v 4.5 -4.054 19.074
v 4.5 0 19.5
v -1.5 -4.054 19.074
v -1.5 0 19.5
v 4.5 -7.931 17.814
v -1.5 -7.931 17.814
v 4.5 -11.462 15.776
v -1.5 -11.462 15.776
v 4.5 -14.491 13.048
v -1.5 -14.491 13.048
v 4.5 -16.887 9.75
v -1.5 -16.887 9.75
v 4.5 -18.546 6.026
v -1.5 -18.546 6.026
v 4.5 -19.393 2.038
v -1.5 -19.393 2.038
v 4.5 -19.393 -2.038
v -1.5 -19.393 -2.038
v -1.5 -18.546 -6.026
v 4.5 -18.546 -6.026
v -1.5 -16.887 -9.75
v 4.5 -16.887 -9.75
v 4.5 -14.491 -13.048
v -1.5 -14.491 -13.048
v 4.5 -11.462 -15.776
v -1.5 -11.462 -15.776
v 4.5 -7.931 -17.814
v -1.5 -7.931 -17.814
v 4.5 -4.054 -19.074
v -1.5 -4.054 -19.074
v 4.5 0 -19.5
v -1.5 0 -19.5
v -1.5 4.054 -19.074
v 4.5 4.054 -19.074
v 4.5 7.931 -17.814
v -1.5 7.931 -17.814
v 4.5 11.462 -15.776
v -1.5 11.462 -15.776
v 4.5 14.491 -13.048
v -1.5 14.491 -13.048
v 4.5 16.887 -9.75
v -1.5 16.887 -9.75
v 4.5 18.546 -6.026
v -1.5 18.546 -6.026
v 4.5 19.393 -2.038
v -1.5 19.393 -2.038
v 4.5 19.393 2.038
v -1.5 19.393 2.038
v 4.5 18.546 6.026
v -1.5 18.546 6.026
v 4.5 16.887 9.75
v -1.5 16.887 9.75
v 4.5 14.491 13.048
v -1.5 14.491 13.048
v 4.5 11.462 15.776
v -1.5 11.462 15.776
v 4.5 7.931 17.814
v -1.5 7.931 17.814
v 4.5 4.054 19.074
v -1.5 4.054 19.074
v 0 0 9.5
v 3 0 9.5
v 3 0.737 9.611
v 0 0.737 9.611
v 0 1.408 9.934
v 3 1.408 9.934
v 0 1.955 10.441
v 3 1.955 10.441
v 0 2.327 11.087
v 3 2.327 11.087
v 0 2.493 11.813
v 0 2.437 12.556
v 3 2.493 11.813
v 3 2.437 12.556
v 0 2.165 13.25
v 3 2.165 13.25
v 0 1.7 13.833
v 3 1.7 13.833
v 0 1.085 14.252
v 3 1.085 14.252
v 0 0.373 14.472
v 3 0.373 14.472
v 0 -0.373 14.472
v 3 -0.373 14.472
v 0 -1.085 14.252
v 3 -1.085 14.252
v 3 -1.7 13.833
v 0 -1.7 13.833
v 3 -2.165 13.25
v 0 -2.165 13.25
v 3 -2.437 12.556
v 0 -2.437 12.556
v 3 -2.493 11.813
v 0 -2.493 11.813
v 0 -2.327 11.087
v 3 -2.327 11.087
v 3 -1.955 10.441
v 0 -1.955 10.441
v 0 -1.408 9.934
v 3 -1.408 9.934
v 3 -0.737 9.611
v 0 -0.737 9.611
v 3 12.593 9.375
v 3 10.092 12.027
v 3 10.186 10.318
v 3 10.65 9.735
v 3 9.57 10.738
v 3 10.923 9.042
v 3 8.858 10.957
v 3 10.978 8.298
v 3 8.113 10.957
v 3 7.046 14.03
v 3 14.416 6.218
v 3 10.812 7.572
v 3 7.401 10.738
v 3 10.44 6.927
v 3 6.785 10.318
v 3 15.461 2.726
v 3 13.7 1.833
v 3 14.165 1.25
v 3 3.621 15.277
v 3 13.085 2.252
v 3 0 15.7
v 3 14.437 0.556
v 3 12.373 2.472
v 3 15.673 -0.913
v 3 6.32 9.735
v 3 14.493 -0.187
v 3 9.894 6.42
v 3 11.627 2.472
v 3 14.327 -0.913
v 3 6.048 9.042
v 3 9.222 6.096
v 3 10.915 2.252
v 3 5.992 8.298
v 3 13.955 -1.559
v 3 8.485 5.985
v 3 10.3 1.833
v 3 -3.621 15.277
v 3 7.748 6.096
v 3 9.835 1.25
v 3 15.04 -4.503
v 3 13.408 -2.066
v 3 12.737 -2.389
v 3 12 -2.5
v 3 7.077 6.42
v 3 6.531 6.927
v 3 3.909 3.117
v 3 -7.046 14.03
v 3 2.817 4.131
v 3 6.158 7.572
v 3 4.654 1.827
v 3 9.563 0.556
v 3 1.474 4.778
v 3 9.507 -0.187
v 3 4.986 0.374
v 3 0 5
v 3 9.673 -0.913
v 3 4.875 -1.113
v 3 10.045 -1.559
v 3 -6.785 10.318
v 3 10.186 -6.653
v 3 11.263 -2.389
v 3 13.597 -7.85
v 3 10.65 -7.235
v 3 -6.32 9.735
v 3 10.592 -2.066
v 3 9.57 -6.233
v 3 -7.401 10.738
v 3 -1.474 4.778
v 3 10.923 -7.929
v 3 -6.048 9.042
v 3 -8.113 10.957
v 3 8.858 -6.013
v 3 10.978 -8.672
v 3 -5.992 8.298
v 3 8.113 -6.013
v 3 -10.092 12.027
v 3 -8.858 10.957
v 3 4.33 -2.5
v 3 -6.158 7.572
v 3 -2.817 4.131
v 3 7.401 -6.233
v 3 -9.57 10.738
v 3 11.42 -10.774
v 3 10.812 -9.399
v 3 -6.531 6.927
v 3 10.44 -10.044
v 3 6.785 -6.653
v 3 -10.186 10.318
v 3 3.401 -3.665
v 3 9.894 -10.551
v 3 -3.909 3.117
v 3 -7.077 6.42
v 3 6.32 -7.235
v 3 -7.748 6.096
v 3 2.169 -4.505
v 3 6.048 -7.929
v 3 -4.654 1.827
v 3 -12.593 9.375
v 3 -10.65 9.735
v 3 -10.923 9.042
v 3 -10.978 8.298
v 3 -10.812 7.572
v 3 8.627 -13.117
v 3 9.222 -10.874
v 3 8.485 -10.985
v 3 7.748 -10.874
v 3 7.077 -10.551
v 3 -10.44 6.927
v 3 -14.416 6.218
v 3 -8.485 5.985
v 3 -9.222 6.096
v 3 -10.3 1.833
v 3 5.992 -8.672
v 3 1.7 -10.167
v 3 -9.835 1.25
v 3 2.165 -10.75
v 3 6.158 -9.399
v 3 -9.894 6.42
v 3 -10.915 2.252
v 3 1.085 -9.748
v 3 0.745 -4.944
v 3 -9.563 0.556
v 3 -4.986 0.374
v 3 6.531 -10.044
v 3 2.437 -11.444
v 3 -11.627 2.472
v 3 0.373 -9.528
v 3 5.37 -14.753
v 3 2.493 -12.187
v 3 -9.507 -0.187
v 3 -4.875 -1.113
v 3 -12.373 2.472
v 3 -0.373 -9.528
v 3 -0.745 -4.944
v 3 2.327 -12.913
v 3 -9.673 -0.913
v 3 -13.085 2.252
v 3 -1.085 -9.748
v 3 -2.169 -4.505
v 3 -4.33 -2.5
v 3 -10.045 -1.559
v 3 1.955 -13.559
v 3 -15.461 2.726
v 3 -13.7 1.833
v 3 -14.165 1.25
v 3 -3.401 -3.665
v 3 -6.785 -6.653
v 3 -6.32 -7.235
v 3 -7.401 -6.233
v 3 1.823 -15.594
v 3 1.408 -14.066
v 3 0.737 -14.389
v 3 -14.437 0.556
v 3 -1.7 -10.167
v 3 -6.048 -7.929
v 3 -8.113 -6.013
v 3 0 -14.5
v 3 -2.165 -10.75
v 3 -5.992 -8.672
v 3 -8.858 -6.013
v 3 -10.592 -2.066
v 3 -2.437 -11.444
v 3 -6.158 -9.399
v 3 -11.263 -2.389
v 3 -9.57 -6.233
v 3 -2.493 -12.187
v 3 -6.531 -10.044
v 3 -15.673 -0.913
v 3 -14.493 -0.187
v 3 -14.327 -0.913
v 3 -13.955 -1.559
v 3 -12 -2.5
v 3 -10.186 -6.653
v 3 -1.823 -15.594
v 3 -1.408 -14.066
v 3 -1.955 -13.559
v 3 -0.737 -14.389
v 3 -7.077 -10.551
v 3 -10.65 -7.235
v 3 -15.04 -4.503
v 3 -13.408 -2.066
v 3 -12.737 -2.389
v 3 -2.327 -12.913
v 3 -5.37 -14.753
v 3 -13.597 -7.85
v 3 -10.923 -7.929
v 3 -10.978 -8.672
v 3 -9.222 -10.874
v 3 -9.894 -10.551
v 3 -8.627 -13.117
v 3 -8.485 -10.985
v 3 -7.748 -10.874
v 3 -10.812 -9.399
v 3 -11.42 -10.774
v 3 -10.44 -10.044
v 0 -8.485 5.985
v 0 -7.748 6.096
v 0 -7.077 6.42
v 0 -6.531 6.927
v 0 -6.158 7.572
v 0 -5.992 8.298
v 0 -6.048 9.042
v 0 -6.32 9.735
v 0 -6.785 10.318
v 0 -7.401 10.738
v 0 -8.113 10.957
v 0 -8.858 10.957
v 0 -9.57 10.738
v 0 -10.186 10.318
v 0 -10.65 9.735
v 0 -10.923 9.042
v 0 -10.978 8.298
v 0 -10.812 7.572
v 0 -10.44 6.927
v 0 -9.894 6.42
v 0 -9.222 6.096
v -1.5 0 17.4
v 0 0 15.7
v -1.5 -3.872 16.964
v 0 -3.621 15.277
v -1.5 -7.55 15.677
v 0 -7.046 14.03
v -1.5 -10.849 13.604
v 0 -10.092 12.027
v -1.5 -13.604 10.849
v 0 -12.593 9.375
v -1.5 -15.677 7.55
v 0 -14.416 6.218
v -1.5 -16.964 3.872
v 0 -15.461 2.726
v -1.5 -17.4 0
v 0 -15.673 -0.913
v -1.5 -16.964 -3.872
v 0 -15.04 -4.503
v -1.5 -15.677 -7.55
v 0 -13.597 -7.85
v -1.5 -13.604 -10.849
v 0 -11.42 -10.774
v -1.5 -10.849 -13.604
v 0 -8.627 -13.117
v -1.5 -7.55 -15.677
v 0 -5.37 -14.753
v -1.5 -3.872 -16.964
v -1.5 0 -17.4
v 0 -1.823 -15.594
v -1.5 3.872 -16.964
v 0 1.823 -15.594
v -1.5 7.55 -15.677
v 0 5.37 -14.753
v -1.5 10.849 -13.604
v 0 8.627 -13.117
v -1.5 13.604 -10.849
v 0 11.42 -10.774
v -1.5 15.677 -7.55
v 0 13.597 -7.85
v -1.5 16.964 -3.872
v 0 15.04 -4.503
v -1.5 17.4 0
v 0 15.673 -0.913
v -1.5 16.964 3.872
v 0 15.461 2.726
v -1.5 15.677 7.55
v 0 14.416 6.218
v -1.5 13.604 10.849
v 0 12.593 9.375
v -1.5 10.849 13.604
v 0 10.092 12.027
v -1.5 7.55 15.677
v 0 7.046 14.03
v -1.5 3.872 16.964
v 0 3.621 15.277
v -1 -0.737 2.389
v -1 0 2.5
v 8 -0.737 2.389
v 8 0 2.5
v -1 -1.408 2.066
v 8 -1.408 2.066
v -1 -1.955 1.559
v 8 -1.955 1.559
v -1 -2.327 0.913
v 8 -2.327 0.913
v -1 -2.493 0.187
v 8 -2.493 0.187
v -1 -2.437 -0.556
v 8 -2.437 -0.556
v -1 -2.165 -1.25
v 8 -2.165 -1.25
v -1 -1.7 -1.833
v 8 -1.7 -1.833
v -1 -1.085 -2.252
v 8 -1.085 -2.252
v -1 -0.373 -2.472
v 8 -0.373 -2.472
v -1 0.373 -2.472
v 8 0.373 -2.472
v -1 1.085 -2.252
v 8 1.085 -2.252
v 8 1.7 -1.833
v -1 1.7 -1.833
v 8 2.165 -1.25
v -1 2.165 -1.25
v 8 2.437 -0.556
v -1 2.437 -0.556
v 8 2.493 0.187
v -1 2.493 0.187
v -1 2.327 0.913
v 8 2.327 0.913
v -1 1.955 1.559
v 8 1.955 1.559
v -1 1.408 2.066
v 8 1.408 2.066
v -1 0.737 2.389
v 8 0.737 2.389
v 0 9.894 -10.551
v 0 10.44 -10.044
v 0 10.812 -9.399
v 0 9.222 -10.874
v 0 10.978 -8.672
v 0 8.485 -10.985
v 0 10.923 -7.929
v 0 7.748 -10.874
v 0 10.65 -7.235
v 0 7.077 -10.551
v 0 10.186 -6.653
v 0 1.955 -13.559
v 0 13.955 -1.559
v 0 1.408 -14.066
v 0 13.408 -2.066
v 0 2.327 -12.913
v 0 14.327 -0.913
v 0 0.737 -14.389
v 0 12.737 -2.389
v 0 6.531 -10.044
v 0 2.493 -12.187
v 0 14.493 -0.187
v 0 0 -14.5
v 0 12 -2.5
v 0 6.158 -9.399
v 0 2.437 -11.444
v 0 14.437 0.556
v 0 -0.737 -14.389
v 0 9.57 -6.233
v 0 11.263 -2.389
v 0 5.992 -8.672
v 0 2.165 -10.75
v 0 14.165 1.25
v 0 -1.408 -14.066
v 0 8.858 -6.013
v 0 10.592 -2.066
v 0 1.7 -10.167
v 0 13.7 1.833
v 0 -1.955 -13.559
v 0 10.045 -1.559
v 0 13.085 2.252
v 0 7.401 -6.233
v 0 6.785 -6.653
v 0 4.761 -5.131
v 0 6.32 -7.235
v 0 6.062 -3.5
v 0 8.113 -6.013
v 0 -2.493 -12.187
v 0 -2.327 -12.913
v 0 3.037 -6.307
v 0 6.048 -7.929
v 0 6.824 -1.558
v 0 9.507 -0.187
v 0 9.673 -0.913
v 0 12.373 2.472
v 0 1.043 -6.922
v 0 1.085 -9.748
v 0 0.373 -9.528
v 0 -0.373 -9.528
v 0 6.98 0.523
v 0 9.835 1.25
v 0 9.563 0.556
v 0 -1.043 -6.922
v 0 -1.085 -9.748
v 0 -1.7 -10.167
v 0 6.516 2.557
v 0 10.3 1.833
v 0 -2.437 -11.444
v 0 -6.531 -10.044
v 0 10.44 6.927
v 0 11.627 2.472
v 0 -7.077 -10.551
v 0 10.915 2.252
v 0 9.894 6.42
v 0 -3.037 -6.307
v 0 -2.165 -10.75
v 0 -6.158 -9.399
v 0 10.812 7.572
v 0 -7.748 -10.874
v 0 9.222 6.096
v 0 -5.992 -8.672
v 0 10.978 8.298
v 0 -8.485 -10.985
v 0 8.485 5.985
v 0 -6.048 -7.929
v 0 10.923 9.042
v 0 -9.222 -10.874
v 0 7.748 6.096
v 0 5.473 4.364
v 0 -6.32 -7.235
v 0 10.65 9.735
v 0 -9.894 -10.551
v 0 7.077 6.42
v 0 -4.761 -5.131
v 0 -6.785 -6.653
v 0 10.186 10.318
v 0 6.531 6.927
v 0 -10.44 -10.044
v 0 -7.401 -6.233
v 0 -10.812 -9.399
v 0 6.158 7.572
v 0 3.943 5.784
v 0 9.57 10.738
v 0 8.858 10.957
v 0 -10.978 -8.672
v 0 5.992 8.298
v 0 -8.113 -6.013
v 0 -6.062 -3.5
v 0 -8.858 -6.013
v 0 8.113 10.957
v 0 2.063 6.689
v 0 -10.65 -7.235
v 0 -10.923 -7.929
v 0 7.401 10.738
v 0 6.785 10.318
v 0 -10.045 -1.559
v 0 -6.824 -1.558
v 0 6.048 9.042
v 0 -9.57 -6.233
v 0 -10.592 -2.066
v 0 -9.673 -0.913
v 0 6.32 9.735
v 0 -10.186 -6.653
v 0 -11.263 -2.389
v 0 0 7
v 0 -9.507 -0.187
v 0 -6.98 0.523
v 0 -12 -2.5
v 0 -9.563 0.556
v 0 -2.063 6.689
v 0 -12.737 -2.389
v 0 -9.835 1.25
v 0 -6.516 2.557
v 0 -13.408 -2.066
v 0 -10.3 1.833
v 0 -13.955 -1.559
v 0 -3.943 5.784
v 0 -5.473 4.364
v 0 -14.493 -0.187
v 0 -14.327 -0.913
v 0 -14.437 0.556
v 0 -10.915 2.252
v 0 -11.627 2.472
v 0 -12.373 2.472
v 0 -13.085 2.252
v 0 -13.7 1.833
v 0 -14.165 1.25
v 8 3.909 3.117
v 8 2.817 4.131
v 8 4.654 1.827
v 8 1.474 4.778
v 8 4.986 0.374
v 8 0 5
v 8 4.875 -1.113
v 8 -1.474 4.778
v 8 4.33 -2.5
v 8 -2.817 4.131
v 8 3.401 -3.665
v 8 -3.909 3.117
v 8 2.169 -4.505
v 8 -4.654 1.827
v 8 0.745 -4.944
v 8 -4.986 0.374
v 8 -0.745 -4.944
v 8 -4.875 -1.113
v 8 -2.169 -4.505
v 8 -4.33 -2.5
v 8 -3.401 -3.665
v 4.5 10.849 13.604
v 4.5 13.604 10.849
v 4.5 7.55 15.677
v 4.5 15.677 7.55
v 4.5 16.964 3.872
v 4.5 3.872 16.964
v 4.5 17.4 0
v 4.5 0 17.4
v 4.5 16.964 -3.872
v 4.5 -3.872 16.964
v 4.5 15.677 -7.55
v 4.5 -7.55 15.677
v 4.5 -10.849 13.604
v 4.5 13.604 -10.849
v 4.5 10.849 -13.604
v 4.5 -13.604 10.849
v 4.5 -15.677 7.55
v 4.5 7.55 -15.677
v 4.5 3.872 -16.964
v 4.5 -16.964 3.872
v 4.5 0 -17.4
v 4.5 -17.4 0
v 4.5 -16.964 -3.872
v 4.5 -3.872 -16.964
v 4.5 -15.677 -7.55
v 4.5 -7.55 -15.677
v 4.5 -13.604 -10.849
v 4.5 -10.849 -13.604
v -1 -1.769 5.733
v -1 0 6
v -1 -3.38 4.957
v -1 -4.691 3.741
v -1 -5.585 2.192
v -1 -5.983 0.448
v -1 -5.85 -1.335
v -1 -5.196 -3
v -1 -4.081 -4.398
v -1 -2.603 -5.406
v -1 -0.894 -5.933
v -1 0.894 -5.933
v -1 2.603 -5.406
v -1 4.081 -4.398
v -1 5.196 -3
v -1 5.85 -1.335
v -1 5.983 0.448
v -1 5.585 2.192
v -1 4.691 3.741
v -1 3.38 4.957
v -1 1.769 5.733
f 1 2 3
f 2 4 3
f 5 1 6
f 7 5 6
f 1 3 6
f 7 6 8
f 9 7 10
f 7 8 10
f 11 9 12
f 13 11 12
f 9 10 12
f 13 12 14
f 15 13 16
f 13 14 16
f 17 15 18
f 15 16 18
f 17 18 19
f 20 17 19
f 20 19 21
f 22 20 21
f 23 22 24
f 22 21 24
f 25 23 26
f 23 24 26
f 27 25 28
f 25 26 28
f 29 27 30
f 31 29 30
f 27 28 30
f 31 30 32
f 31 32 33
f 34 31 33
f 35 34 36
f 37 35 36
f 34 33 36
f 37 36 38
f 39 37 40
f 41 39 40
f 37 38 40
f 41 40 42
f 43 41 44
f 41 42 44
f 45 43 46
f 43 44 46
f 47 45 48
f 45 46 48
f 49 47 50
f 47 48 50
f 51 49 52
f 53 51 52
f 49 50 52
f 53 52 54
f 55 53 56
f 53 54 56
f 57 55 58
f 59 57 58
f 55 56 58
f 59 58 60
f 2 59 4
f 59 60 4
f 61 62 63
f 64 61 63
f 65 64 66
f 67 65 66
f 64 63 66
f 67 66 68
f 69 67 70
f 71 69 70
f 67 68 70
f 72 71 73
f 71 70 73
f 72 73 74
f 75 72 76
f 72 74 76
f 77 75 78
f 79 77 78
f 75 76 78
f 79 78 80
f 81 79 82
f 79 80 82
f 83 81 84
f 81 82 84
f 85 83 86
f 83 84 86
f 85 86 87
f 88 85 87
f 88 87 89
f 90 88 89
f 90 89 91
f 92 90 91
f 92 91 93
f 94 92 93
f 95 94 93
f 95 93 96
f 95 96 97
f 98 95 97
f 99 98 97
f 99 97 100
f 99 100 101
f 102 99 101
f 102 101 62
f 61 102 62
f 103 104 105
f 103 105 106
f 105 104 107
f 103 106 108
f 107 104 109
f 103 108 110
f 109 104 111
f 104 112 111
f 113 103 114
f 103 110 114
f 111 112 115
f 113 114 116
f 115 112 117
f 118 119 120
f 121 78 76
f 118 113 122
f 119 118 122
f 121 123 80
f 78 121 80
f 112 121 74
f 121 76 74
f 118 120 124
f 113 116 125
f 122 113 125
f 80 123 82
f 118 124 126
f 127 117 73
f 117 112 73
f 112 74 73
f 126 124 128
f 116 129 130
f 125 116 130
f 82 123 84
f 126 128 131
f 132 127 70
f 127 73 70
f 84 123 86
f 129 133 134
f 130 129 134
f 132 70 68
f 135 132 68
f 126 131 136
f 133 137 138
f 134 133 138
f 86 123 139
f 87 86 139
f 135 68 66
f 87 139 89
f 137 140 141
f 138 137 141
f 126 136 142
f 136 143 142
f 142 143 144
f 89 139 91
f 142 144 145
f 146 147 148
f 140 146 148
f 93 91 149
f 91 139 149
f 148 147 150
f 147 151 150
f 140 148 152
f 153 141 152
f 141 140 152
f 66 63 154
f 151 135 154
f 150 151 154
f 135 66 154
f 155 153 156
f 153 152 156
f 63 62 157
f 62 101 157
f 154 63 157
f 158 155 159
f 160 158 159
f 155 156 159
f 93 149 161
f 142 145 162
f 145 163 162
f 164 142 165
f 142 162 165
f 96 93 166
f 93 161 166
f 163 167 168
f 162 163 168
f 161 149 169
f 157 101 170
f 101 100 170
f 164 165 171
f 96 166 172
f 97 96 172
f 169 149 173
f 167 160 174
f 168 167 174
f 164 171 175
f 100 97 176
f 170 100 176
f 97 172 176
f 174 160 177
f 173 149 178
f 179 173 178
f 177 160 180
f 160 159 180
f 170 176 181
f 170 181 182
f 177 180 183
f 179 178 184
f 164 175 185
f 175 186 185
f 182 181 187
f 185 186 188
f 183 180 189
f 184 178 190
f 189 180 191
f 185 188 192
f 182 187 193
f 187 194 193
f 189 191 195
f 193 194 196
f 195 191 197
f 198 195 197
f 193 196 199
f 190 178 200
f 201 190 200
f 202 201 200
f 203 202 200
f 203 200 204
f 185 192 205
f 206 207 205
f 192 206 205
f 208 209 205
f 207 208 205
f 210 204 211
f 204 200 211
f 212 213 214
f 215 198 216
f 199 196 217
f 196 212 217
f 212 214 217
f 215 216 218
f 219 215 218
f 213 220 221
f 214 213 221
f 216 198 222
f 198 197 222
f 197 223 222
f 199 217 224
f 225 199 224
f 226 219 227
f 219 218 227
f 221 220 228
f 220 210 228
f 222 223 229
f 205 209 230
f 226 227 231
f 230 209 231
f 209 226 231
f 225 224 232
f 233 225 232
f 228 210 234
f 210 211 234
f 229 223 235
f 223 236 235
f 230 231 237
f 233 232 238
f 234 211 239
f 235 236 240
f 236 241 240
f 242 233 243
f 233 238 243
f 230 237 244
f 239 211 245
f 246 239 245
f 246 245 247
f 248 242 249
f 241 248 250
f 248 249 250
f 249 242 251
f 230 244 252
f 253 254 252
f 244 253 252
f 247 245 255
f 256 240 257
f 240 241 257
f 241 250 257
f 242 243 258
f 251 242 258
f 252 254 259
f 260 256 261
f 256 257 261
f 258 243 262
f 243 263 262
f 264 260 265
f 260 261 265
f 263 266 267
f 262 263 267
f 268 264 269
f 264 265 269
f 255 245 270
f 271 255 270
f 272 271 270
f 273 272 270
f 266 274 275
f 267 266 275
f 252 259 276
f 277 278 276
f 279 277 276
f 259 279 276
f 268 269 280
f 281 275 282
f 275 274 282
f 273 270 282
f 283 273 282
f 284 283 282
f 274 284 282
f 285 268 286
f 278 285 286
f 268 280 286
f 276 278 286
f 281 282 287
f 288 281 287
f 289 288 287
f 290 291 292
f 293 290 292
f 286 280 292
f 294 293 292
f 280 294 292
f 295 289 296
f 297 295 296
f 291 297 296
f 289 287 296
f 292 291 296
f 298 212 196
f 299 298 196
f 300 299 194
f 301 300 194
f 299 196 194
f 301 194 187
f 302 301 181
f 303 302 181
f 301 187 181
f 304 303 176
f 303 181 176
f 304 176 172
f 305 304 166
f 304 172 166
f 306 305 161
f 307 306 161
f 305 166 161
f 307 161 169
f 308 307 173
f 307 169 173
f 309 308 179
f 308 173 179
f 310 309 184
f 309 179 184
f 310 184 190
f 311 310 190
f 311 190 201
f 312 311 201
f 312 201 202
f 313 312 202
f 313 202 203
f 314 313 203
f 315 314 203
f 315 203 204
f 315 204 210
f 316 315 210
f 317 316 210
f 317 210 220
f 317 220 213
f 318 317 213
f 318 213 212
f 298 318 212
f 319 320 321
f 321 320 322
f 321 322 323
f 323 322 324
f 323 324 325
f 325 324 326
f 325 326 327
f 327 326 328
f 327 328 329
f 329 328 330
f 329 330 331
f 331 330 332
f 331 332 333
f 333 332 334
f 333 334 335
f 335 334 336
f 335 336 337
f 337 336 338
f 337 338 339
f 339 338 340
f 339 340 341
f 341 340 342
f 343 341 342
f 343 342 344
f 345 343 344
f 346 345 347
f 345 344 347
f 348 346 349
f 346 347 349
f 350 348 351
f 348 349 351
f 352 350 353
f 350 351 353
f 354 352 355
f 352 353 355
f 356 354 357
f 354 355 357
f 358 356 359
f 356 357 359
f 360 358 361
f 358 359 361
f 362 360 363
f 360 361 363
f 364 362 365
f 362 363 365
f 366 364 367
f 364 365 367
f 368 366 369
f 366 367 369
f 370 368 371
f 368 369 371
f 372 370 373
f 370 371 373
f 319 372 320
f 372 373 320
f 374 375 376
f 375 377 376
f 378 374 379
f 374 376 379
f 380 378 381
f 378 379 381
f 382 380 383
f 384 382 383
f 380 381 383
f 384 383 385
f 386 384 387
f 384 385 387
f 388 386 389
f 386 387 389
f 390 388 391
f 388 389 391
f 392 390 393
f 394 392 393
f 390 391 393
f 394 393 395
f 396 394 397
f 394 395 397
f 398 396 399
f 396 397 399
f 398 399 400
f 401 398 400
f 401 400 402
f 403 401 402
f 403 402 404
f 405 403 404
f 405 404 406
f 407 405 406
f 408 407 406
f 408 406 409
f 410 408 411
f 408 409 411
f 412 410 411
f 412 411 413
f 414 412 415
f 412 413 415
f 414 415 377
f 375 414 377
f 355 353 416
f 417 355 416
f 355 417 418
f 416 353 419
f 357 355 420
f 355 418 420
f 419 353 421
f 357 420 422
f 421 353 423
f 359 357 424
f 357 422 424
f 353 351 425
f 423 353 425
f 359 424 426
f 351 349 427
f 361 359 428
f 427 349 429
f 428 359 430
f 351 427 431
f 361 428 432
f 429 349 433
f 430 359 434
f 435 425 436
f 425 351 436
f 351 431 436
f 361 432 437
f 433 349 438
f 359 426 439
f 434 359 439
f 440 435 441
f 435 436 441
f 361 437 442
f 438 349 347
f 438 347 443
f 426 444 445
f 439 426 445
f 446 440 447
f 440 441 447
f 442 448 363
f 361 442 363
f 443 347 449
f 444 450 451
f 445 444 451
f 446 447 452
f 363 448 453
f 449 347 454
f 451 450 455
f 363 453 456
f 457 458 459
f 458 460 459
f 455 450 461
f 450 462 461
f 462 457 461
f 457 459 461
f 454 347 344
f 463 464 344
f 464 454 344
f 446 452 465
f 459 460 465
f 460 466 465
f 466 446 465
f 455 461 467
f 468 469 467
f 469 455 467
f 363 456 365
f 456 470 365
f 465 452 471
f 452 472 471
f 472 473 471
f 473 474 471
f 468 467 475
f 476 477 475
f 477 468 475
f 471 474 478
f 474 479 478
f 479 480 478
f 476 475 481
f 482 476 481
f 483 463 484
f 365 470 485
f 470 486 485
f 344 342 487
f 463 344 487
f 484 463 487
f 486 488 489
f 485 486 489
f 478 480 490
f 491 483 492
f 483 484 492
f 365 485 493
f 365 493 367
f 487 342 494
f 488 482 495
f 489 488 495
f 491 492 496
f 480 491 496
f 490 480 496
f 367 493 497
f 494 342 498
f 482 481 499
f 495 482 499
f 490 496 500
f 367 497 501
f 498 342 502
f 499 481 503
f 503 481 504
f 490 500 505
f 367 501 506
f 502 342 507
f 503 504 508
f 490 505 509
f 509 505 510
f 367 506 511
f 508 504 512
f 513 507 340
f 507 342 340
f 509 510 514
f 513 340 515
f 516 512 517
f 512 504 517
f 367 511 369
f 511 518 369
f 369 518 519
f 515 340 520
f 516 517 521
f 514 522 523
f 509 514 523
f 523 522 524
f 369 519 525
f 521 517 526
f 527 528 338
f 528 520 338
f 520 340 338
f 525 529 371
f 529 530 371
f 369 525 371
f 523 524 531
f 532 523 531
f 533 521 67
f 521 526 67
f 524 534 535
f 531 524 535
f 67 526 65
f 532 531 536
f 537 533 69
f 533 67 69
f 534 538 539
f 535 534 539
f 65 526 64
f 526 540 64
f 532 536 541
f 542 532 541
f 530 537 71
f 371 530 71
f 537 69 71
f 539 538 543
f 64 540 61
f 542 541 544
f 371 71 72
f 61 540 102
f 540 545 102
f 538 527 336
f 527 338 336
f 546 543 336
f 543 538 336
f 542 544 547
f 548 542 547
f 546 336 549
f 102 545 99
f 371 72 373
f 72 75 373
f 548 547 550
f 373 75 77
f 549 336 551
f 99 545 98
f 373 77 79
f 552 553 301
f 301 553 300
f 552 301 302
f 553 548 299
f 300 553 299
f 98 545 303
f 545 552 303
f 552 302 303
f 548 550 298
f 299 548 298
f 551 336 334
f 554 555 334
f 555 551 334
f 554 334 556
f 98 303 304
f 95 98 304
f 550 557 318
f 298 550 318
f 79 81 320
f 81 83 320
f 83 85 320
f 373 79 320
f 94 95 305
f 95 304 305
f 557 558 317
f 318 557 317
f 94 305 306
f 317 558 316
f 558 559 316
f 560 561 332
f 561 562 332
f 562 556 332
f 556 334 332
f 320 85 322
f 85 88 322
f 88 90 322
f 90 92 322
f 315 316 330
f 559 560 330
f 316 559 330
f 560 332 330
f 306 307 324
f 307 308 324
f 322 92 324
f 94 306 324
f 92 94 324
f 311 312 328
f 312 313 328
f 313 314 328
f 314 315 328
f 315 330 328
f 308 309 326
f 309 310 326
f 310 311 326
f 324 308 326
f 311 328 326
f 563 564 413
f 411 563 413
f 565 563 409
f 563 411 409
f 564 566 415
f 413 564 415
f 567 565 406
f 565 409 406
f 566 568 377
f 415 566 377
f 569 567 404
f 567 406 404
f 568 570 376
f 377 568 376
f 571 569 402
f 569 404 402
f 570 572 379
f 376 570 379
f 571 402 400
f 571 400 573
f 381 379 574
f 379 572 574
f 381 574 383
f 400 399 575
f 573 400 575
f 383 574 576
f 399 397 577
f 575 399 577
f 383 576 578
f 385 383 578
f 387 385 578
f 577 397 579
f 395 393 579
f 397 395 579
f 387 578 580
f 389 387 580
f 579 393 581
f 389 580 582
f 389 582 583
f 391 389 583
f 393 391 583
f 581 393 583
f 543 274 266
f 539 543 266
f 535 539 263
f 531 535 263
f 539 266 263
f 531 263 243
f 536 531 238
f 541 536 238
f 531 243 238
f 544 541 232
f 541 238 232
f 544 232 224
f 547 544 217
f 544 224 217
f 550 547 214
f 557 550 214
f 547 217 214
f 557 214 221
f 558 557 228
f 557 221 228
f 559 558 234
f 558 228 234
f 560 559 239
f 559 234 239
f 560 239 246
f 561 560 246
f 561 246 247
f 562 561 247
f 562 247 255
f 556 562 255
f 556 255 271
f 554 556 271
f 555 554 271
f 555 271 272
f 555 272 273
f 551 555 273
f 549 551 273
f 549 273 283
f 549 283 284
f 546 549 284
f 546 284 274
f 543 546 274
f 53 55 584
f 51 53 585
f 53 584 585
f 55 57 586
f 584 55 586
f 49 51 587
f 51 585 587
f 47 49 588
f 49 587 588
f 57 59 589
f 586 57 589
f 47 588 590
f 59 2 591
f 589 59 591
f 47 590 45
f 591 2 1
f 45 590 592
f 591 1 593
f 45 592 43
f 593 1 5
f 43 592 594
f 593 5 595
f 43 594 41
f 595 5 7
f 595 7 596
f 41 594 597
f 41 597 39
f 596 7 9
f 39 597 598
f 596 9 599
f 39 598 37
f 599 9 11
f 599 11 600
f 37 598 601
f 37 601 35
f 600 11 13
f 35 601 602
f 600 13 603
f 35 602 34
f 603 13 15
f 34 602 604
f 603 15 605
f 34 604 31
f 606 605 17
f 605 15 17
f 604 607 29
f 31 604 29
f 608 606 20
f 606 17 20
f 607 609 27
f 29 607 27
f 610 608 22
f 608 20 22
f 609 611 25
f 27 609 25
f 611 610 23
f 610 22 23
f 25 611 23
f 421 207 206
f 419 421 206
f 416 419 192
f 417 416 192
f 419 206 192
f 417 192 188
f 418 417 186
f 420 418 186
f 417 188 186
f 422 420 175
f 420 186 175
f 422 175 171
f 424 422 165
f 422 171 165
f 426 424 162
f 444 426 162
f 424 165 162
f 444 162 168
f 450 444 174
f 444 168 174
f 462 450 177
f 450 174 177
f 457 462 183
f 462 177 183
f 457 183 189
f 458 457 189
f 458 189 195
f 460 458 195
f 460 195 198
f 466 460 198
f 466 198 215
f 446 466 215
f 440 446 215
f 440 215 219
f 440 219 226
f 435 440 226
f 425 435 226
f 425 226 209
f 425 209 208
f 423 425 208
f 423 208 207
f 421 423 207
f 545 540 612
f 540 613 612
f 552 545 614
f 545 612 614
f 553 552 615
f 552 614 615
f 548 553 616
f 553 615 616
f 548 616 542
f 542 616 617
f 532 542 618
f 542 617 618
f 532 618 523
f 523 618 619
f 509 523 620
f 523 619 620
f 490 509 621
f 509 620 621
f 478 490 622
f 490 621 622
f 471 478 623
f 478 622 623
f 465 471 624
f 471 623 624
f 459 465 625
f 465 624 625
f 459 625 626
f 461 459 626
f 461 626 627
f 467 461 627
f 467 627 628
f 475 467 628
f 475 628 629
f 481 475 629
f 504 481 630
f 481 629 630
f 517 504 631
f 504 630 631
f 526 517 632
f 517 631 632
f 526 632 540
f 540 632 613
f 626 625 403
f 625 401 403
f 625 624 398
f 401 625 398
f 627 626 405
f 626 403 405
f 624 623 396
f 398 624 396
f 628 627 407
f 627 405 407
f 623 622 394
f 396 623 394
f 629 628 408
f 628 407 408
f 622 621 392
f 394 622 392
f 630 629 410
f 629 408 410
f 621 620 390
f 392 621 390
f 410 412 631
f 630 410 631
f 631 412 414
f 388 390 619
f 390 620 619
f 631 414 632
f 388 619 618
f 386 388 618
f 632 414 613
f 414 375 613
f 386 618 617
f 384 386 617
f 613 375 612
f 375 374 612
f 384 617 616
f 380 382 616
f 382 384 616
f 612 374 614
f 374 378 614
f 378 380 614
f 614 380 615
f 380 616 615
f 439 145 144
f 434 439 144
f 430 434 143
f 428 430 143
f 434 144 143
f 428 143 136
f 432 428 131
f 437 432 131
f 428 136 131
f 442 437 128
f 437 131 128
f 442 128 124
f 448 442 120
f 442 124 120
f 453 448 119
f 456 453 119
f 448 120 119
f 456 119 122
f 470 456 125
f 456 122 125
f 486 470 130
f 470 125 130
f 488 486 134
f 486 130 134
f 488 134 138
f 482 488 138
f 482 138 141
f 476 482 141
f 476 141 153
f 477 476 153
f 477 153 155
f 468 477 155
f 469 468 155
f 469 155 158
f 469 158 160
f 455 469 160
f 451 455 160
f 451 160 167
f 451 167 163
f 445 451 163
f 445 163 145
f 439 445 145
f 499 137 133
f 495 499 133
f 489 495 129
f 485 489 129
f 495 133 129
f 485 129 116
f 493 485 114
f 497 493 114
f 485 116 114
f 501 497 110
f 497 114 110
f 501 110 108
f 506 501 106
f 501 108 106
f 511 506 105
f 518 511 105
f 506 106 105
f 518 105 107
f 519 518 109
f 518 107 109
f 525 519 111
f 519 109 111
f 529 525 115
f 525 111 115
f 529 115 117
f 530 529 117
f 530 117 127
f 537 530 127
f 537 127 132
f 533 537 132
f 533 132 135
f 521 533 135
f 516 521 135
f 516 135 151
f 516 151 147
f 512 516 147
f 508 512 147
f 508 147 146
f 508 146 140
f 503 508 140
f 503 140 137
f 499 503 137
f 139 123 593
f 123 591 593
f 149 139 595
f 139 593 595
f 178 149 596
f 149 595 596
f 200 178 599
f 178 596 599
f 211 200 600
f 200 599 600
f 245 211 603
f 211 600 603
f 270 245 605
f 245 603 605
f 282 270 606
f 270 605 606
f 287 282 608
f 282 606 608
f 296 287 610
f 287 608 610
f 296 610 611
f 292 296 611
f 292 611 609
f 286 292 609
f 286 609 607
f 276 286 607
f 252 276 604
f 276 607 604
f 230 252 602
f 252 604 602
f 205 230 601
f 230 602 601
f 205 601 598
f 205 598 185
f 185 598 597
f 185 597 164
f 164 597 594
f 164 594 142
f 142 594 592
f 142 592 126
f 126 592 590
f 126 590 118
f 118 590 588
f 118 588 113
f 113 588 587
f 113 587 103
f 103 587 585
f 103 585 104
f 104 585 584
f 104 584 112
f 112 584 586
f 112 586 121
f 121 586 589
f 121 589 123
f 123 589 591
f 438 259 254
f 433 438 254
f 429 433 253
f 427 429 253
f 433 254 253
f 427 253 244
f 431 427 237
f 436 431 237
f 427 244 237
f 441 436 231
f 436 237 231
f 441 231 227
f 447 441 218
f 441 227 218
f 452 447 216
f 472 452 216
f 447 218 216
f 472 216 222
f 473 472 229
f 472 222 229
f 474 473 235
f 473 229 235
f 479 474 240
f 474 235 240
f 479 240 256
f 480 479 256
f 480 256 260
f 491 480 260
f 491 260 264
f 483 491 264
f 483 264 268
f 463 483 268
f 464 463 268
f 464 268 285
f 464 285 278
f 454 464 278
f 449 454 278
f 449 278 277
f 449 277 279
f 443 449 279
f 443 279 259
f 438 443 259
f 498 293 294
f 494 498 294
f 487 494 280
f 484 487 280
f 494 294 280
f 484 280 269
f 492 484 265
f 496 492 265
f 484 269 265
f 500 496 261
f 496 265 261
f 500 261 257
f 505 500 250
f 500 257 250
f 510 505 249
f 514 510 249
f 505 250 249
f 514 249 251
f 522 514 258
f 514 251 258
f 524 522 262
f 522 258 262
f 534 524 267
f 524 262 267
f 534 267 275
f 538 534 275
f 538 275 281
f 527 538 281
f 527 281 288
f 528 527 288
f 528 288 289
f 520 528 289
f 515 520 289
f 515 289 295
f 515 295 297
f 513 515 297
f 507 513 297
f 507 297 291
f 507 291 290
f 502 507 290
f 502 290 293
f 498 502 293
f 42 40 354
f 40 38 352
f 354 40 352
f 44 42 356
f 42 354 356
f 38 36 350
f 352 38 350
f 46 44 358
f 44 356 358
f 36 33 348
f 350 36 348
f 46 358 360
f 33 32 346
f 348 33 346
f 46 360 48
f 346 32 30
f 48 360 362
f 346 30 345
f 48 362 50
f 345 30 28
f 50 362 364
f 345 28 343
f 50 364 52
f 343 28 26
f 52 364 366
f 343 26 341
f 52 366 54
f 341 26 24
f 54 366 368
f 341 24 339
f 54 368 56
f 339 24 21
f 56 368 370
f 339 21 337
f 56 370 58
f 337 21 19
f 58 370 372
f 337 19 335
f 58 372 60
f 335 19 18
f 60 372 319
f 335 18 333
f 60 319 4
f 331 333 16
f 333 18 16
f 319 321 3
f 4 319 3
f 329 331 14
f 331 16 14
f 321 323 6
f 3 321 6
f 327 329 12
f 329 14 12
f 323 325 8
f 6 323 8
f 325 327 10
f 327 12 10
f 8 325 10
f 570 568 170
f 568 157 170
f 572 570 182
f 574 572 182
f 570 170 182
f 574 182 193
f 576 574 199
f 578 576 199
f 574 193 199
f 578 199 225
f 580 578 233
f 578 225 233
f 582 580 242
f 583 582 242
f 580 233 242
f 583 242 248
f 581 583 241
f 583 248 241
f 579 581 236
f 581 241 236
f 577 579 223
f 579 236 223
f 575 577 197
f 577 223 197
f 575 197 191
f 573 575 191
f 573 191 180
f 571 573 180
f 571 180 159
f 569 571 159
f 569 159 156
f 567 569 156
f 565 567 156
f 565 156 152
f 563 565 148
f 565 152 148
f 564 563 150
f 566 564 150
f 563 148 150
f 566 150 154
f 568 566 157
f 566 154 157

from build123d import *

# Parameters (mm, degrees)
SKETCH2_R          = 2.5
CUT_EXTRUDE1_DEPTH = 29.026772914


with BuildPart() as part:
    # Sketch1 → Revolve1 (revolve)
    with BuildSketch(Plane.XY, mode=Mode.PRIVATE) as revolve1_sk:
        Polygon((0, 7), (0, 2.5), (8, 2.5), (8, 5), (3, 5), (3, 15.7), (4.5, 17.4), (4.5, 19.5), (-1.5, 19.5), (-1.5, 17.4), (0, 15.7), align=None)
        Polygon((-1, 2.5), (0, 2.5), (0, 7), (-1, 6), align=None)
    revolve(revolve1_sk.sketch.rotate(Axis((0, 0, 0), (1, 0, 0)), 90), axis=Axis((0, 0, 0), (1, 0, 0)))

    # Sketch2 → Cut-Extrude1 (cut, through all)
    with BuildSketch(Plane(origin=(3, 0, 0), x_dir=(0, 0, -1), z_dir=(1, 0, 0))):
        with Locations((0, 12)):
            Circle(SKETCH2_R)
        with Locations((8.485281374, 8.485281374)):
            Circle(SKETCH2_R)
        with Locations((12, 0)):
            Circle(SKETCH2_R)
        with Locations((8.485281374, -8.485281374)):
            Circle(SKETCH2_R)
        with Locations((0, -12)):
            Circle(SKETCH2_R)
        with Locations((-8.485281374, -8.485281374)):
            Circle(SKETCH2_R)
        with Locations((-12, 0)):
            Circle(SKETCH2_R)
        with Locations((-8.485281374, 8.485281374)):
            Circle(SKETCH2_R)
    extrude(amount=-CUT_EXTRUDE1_DEPTH, mode=Mode.SUBTRACT)


solid = part.part
